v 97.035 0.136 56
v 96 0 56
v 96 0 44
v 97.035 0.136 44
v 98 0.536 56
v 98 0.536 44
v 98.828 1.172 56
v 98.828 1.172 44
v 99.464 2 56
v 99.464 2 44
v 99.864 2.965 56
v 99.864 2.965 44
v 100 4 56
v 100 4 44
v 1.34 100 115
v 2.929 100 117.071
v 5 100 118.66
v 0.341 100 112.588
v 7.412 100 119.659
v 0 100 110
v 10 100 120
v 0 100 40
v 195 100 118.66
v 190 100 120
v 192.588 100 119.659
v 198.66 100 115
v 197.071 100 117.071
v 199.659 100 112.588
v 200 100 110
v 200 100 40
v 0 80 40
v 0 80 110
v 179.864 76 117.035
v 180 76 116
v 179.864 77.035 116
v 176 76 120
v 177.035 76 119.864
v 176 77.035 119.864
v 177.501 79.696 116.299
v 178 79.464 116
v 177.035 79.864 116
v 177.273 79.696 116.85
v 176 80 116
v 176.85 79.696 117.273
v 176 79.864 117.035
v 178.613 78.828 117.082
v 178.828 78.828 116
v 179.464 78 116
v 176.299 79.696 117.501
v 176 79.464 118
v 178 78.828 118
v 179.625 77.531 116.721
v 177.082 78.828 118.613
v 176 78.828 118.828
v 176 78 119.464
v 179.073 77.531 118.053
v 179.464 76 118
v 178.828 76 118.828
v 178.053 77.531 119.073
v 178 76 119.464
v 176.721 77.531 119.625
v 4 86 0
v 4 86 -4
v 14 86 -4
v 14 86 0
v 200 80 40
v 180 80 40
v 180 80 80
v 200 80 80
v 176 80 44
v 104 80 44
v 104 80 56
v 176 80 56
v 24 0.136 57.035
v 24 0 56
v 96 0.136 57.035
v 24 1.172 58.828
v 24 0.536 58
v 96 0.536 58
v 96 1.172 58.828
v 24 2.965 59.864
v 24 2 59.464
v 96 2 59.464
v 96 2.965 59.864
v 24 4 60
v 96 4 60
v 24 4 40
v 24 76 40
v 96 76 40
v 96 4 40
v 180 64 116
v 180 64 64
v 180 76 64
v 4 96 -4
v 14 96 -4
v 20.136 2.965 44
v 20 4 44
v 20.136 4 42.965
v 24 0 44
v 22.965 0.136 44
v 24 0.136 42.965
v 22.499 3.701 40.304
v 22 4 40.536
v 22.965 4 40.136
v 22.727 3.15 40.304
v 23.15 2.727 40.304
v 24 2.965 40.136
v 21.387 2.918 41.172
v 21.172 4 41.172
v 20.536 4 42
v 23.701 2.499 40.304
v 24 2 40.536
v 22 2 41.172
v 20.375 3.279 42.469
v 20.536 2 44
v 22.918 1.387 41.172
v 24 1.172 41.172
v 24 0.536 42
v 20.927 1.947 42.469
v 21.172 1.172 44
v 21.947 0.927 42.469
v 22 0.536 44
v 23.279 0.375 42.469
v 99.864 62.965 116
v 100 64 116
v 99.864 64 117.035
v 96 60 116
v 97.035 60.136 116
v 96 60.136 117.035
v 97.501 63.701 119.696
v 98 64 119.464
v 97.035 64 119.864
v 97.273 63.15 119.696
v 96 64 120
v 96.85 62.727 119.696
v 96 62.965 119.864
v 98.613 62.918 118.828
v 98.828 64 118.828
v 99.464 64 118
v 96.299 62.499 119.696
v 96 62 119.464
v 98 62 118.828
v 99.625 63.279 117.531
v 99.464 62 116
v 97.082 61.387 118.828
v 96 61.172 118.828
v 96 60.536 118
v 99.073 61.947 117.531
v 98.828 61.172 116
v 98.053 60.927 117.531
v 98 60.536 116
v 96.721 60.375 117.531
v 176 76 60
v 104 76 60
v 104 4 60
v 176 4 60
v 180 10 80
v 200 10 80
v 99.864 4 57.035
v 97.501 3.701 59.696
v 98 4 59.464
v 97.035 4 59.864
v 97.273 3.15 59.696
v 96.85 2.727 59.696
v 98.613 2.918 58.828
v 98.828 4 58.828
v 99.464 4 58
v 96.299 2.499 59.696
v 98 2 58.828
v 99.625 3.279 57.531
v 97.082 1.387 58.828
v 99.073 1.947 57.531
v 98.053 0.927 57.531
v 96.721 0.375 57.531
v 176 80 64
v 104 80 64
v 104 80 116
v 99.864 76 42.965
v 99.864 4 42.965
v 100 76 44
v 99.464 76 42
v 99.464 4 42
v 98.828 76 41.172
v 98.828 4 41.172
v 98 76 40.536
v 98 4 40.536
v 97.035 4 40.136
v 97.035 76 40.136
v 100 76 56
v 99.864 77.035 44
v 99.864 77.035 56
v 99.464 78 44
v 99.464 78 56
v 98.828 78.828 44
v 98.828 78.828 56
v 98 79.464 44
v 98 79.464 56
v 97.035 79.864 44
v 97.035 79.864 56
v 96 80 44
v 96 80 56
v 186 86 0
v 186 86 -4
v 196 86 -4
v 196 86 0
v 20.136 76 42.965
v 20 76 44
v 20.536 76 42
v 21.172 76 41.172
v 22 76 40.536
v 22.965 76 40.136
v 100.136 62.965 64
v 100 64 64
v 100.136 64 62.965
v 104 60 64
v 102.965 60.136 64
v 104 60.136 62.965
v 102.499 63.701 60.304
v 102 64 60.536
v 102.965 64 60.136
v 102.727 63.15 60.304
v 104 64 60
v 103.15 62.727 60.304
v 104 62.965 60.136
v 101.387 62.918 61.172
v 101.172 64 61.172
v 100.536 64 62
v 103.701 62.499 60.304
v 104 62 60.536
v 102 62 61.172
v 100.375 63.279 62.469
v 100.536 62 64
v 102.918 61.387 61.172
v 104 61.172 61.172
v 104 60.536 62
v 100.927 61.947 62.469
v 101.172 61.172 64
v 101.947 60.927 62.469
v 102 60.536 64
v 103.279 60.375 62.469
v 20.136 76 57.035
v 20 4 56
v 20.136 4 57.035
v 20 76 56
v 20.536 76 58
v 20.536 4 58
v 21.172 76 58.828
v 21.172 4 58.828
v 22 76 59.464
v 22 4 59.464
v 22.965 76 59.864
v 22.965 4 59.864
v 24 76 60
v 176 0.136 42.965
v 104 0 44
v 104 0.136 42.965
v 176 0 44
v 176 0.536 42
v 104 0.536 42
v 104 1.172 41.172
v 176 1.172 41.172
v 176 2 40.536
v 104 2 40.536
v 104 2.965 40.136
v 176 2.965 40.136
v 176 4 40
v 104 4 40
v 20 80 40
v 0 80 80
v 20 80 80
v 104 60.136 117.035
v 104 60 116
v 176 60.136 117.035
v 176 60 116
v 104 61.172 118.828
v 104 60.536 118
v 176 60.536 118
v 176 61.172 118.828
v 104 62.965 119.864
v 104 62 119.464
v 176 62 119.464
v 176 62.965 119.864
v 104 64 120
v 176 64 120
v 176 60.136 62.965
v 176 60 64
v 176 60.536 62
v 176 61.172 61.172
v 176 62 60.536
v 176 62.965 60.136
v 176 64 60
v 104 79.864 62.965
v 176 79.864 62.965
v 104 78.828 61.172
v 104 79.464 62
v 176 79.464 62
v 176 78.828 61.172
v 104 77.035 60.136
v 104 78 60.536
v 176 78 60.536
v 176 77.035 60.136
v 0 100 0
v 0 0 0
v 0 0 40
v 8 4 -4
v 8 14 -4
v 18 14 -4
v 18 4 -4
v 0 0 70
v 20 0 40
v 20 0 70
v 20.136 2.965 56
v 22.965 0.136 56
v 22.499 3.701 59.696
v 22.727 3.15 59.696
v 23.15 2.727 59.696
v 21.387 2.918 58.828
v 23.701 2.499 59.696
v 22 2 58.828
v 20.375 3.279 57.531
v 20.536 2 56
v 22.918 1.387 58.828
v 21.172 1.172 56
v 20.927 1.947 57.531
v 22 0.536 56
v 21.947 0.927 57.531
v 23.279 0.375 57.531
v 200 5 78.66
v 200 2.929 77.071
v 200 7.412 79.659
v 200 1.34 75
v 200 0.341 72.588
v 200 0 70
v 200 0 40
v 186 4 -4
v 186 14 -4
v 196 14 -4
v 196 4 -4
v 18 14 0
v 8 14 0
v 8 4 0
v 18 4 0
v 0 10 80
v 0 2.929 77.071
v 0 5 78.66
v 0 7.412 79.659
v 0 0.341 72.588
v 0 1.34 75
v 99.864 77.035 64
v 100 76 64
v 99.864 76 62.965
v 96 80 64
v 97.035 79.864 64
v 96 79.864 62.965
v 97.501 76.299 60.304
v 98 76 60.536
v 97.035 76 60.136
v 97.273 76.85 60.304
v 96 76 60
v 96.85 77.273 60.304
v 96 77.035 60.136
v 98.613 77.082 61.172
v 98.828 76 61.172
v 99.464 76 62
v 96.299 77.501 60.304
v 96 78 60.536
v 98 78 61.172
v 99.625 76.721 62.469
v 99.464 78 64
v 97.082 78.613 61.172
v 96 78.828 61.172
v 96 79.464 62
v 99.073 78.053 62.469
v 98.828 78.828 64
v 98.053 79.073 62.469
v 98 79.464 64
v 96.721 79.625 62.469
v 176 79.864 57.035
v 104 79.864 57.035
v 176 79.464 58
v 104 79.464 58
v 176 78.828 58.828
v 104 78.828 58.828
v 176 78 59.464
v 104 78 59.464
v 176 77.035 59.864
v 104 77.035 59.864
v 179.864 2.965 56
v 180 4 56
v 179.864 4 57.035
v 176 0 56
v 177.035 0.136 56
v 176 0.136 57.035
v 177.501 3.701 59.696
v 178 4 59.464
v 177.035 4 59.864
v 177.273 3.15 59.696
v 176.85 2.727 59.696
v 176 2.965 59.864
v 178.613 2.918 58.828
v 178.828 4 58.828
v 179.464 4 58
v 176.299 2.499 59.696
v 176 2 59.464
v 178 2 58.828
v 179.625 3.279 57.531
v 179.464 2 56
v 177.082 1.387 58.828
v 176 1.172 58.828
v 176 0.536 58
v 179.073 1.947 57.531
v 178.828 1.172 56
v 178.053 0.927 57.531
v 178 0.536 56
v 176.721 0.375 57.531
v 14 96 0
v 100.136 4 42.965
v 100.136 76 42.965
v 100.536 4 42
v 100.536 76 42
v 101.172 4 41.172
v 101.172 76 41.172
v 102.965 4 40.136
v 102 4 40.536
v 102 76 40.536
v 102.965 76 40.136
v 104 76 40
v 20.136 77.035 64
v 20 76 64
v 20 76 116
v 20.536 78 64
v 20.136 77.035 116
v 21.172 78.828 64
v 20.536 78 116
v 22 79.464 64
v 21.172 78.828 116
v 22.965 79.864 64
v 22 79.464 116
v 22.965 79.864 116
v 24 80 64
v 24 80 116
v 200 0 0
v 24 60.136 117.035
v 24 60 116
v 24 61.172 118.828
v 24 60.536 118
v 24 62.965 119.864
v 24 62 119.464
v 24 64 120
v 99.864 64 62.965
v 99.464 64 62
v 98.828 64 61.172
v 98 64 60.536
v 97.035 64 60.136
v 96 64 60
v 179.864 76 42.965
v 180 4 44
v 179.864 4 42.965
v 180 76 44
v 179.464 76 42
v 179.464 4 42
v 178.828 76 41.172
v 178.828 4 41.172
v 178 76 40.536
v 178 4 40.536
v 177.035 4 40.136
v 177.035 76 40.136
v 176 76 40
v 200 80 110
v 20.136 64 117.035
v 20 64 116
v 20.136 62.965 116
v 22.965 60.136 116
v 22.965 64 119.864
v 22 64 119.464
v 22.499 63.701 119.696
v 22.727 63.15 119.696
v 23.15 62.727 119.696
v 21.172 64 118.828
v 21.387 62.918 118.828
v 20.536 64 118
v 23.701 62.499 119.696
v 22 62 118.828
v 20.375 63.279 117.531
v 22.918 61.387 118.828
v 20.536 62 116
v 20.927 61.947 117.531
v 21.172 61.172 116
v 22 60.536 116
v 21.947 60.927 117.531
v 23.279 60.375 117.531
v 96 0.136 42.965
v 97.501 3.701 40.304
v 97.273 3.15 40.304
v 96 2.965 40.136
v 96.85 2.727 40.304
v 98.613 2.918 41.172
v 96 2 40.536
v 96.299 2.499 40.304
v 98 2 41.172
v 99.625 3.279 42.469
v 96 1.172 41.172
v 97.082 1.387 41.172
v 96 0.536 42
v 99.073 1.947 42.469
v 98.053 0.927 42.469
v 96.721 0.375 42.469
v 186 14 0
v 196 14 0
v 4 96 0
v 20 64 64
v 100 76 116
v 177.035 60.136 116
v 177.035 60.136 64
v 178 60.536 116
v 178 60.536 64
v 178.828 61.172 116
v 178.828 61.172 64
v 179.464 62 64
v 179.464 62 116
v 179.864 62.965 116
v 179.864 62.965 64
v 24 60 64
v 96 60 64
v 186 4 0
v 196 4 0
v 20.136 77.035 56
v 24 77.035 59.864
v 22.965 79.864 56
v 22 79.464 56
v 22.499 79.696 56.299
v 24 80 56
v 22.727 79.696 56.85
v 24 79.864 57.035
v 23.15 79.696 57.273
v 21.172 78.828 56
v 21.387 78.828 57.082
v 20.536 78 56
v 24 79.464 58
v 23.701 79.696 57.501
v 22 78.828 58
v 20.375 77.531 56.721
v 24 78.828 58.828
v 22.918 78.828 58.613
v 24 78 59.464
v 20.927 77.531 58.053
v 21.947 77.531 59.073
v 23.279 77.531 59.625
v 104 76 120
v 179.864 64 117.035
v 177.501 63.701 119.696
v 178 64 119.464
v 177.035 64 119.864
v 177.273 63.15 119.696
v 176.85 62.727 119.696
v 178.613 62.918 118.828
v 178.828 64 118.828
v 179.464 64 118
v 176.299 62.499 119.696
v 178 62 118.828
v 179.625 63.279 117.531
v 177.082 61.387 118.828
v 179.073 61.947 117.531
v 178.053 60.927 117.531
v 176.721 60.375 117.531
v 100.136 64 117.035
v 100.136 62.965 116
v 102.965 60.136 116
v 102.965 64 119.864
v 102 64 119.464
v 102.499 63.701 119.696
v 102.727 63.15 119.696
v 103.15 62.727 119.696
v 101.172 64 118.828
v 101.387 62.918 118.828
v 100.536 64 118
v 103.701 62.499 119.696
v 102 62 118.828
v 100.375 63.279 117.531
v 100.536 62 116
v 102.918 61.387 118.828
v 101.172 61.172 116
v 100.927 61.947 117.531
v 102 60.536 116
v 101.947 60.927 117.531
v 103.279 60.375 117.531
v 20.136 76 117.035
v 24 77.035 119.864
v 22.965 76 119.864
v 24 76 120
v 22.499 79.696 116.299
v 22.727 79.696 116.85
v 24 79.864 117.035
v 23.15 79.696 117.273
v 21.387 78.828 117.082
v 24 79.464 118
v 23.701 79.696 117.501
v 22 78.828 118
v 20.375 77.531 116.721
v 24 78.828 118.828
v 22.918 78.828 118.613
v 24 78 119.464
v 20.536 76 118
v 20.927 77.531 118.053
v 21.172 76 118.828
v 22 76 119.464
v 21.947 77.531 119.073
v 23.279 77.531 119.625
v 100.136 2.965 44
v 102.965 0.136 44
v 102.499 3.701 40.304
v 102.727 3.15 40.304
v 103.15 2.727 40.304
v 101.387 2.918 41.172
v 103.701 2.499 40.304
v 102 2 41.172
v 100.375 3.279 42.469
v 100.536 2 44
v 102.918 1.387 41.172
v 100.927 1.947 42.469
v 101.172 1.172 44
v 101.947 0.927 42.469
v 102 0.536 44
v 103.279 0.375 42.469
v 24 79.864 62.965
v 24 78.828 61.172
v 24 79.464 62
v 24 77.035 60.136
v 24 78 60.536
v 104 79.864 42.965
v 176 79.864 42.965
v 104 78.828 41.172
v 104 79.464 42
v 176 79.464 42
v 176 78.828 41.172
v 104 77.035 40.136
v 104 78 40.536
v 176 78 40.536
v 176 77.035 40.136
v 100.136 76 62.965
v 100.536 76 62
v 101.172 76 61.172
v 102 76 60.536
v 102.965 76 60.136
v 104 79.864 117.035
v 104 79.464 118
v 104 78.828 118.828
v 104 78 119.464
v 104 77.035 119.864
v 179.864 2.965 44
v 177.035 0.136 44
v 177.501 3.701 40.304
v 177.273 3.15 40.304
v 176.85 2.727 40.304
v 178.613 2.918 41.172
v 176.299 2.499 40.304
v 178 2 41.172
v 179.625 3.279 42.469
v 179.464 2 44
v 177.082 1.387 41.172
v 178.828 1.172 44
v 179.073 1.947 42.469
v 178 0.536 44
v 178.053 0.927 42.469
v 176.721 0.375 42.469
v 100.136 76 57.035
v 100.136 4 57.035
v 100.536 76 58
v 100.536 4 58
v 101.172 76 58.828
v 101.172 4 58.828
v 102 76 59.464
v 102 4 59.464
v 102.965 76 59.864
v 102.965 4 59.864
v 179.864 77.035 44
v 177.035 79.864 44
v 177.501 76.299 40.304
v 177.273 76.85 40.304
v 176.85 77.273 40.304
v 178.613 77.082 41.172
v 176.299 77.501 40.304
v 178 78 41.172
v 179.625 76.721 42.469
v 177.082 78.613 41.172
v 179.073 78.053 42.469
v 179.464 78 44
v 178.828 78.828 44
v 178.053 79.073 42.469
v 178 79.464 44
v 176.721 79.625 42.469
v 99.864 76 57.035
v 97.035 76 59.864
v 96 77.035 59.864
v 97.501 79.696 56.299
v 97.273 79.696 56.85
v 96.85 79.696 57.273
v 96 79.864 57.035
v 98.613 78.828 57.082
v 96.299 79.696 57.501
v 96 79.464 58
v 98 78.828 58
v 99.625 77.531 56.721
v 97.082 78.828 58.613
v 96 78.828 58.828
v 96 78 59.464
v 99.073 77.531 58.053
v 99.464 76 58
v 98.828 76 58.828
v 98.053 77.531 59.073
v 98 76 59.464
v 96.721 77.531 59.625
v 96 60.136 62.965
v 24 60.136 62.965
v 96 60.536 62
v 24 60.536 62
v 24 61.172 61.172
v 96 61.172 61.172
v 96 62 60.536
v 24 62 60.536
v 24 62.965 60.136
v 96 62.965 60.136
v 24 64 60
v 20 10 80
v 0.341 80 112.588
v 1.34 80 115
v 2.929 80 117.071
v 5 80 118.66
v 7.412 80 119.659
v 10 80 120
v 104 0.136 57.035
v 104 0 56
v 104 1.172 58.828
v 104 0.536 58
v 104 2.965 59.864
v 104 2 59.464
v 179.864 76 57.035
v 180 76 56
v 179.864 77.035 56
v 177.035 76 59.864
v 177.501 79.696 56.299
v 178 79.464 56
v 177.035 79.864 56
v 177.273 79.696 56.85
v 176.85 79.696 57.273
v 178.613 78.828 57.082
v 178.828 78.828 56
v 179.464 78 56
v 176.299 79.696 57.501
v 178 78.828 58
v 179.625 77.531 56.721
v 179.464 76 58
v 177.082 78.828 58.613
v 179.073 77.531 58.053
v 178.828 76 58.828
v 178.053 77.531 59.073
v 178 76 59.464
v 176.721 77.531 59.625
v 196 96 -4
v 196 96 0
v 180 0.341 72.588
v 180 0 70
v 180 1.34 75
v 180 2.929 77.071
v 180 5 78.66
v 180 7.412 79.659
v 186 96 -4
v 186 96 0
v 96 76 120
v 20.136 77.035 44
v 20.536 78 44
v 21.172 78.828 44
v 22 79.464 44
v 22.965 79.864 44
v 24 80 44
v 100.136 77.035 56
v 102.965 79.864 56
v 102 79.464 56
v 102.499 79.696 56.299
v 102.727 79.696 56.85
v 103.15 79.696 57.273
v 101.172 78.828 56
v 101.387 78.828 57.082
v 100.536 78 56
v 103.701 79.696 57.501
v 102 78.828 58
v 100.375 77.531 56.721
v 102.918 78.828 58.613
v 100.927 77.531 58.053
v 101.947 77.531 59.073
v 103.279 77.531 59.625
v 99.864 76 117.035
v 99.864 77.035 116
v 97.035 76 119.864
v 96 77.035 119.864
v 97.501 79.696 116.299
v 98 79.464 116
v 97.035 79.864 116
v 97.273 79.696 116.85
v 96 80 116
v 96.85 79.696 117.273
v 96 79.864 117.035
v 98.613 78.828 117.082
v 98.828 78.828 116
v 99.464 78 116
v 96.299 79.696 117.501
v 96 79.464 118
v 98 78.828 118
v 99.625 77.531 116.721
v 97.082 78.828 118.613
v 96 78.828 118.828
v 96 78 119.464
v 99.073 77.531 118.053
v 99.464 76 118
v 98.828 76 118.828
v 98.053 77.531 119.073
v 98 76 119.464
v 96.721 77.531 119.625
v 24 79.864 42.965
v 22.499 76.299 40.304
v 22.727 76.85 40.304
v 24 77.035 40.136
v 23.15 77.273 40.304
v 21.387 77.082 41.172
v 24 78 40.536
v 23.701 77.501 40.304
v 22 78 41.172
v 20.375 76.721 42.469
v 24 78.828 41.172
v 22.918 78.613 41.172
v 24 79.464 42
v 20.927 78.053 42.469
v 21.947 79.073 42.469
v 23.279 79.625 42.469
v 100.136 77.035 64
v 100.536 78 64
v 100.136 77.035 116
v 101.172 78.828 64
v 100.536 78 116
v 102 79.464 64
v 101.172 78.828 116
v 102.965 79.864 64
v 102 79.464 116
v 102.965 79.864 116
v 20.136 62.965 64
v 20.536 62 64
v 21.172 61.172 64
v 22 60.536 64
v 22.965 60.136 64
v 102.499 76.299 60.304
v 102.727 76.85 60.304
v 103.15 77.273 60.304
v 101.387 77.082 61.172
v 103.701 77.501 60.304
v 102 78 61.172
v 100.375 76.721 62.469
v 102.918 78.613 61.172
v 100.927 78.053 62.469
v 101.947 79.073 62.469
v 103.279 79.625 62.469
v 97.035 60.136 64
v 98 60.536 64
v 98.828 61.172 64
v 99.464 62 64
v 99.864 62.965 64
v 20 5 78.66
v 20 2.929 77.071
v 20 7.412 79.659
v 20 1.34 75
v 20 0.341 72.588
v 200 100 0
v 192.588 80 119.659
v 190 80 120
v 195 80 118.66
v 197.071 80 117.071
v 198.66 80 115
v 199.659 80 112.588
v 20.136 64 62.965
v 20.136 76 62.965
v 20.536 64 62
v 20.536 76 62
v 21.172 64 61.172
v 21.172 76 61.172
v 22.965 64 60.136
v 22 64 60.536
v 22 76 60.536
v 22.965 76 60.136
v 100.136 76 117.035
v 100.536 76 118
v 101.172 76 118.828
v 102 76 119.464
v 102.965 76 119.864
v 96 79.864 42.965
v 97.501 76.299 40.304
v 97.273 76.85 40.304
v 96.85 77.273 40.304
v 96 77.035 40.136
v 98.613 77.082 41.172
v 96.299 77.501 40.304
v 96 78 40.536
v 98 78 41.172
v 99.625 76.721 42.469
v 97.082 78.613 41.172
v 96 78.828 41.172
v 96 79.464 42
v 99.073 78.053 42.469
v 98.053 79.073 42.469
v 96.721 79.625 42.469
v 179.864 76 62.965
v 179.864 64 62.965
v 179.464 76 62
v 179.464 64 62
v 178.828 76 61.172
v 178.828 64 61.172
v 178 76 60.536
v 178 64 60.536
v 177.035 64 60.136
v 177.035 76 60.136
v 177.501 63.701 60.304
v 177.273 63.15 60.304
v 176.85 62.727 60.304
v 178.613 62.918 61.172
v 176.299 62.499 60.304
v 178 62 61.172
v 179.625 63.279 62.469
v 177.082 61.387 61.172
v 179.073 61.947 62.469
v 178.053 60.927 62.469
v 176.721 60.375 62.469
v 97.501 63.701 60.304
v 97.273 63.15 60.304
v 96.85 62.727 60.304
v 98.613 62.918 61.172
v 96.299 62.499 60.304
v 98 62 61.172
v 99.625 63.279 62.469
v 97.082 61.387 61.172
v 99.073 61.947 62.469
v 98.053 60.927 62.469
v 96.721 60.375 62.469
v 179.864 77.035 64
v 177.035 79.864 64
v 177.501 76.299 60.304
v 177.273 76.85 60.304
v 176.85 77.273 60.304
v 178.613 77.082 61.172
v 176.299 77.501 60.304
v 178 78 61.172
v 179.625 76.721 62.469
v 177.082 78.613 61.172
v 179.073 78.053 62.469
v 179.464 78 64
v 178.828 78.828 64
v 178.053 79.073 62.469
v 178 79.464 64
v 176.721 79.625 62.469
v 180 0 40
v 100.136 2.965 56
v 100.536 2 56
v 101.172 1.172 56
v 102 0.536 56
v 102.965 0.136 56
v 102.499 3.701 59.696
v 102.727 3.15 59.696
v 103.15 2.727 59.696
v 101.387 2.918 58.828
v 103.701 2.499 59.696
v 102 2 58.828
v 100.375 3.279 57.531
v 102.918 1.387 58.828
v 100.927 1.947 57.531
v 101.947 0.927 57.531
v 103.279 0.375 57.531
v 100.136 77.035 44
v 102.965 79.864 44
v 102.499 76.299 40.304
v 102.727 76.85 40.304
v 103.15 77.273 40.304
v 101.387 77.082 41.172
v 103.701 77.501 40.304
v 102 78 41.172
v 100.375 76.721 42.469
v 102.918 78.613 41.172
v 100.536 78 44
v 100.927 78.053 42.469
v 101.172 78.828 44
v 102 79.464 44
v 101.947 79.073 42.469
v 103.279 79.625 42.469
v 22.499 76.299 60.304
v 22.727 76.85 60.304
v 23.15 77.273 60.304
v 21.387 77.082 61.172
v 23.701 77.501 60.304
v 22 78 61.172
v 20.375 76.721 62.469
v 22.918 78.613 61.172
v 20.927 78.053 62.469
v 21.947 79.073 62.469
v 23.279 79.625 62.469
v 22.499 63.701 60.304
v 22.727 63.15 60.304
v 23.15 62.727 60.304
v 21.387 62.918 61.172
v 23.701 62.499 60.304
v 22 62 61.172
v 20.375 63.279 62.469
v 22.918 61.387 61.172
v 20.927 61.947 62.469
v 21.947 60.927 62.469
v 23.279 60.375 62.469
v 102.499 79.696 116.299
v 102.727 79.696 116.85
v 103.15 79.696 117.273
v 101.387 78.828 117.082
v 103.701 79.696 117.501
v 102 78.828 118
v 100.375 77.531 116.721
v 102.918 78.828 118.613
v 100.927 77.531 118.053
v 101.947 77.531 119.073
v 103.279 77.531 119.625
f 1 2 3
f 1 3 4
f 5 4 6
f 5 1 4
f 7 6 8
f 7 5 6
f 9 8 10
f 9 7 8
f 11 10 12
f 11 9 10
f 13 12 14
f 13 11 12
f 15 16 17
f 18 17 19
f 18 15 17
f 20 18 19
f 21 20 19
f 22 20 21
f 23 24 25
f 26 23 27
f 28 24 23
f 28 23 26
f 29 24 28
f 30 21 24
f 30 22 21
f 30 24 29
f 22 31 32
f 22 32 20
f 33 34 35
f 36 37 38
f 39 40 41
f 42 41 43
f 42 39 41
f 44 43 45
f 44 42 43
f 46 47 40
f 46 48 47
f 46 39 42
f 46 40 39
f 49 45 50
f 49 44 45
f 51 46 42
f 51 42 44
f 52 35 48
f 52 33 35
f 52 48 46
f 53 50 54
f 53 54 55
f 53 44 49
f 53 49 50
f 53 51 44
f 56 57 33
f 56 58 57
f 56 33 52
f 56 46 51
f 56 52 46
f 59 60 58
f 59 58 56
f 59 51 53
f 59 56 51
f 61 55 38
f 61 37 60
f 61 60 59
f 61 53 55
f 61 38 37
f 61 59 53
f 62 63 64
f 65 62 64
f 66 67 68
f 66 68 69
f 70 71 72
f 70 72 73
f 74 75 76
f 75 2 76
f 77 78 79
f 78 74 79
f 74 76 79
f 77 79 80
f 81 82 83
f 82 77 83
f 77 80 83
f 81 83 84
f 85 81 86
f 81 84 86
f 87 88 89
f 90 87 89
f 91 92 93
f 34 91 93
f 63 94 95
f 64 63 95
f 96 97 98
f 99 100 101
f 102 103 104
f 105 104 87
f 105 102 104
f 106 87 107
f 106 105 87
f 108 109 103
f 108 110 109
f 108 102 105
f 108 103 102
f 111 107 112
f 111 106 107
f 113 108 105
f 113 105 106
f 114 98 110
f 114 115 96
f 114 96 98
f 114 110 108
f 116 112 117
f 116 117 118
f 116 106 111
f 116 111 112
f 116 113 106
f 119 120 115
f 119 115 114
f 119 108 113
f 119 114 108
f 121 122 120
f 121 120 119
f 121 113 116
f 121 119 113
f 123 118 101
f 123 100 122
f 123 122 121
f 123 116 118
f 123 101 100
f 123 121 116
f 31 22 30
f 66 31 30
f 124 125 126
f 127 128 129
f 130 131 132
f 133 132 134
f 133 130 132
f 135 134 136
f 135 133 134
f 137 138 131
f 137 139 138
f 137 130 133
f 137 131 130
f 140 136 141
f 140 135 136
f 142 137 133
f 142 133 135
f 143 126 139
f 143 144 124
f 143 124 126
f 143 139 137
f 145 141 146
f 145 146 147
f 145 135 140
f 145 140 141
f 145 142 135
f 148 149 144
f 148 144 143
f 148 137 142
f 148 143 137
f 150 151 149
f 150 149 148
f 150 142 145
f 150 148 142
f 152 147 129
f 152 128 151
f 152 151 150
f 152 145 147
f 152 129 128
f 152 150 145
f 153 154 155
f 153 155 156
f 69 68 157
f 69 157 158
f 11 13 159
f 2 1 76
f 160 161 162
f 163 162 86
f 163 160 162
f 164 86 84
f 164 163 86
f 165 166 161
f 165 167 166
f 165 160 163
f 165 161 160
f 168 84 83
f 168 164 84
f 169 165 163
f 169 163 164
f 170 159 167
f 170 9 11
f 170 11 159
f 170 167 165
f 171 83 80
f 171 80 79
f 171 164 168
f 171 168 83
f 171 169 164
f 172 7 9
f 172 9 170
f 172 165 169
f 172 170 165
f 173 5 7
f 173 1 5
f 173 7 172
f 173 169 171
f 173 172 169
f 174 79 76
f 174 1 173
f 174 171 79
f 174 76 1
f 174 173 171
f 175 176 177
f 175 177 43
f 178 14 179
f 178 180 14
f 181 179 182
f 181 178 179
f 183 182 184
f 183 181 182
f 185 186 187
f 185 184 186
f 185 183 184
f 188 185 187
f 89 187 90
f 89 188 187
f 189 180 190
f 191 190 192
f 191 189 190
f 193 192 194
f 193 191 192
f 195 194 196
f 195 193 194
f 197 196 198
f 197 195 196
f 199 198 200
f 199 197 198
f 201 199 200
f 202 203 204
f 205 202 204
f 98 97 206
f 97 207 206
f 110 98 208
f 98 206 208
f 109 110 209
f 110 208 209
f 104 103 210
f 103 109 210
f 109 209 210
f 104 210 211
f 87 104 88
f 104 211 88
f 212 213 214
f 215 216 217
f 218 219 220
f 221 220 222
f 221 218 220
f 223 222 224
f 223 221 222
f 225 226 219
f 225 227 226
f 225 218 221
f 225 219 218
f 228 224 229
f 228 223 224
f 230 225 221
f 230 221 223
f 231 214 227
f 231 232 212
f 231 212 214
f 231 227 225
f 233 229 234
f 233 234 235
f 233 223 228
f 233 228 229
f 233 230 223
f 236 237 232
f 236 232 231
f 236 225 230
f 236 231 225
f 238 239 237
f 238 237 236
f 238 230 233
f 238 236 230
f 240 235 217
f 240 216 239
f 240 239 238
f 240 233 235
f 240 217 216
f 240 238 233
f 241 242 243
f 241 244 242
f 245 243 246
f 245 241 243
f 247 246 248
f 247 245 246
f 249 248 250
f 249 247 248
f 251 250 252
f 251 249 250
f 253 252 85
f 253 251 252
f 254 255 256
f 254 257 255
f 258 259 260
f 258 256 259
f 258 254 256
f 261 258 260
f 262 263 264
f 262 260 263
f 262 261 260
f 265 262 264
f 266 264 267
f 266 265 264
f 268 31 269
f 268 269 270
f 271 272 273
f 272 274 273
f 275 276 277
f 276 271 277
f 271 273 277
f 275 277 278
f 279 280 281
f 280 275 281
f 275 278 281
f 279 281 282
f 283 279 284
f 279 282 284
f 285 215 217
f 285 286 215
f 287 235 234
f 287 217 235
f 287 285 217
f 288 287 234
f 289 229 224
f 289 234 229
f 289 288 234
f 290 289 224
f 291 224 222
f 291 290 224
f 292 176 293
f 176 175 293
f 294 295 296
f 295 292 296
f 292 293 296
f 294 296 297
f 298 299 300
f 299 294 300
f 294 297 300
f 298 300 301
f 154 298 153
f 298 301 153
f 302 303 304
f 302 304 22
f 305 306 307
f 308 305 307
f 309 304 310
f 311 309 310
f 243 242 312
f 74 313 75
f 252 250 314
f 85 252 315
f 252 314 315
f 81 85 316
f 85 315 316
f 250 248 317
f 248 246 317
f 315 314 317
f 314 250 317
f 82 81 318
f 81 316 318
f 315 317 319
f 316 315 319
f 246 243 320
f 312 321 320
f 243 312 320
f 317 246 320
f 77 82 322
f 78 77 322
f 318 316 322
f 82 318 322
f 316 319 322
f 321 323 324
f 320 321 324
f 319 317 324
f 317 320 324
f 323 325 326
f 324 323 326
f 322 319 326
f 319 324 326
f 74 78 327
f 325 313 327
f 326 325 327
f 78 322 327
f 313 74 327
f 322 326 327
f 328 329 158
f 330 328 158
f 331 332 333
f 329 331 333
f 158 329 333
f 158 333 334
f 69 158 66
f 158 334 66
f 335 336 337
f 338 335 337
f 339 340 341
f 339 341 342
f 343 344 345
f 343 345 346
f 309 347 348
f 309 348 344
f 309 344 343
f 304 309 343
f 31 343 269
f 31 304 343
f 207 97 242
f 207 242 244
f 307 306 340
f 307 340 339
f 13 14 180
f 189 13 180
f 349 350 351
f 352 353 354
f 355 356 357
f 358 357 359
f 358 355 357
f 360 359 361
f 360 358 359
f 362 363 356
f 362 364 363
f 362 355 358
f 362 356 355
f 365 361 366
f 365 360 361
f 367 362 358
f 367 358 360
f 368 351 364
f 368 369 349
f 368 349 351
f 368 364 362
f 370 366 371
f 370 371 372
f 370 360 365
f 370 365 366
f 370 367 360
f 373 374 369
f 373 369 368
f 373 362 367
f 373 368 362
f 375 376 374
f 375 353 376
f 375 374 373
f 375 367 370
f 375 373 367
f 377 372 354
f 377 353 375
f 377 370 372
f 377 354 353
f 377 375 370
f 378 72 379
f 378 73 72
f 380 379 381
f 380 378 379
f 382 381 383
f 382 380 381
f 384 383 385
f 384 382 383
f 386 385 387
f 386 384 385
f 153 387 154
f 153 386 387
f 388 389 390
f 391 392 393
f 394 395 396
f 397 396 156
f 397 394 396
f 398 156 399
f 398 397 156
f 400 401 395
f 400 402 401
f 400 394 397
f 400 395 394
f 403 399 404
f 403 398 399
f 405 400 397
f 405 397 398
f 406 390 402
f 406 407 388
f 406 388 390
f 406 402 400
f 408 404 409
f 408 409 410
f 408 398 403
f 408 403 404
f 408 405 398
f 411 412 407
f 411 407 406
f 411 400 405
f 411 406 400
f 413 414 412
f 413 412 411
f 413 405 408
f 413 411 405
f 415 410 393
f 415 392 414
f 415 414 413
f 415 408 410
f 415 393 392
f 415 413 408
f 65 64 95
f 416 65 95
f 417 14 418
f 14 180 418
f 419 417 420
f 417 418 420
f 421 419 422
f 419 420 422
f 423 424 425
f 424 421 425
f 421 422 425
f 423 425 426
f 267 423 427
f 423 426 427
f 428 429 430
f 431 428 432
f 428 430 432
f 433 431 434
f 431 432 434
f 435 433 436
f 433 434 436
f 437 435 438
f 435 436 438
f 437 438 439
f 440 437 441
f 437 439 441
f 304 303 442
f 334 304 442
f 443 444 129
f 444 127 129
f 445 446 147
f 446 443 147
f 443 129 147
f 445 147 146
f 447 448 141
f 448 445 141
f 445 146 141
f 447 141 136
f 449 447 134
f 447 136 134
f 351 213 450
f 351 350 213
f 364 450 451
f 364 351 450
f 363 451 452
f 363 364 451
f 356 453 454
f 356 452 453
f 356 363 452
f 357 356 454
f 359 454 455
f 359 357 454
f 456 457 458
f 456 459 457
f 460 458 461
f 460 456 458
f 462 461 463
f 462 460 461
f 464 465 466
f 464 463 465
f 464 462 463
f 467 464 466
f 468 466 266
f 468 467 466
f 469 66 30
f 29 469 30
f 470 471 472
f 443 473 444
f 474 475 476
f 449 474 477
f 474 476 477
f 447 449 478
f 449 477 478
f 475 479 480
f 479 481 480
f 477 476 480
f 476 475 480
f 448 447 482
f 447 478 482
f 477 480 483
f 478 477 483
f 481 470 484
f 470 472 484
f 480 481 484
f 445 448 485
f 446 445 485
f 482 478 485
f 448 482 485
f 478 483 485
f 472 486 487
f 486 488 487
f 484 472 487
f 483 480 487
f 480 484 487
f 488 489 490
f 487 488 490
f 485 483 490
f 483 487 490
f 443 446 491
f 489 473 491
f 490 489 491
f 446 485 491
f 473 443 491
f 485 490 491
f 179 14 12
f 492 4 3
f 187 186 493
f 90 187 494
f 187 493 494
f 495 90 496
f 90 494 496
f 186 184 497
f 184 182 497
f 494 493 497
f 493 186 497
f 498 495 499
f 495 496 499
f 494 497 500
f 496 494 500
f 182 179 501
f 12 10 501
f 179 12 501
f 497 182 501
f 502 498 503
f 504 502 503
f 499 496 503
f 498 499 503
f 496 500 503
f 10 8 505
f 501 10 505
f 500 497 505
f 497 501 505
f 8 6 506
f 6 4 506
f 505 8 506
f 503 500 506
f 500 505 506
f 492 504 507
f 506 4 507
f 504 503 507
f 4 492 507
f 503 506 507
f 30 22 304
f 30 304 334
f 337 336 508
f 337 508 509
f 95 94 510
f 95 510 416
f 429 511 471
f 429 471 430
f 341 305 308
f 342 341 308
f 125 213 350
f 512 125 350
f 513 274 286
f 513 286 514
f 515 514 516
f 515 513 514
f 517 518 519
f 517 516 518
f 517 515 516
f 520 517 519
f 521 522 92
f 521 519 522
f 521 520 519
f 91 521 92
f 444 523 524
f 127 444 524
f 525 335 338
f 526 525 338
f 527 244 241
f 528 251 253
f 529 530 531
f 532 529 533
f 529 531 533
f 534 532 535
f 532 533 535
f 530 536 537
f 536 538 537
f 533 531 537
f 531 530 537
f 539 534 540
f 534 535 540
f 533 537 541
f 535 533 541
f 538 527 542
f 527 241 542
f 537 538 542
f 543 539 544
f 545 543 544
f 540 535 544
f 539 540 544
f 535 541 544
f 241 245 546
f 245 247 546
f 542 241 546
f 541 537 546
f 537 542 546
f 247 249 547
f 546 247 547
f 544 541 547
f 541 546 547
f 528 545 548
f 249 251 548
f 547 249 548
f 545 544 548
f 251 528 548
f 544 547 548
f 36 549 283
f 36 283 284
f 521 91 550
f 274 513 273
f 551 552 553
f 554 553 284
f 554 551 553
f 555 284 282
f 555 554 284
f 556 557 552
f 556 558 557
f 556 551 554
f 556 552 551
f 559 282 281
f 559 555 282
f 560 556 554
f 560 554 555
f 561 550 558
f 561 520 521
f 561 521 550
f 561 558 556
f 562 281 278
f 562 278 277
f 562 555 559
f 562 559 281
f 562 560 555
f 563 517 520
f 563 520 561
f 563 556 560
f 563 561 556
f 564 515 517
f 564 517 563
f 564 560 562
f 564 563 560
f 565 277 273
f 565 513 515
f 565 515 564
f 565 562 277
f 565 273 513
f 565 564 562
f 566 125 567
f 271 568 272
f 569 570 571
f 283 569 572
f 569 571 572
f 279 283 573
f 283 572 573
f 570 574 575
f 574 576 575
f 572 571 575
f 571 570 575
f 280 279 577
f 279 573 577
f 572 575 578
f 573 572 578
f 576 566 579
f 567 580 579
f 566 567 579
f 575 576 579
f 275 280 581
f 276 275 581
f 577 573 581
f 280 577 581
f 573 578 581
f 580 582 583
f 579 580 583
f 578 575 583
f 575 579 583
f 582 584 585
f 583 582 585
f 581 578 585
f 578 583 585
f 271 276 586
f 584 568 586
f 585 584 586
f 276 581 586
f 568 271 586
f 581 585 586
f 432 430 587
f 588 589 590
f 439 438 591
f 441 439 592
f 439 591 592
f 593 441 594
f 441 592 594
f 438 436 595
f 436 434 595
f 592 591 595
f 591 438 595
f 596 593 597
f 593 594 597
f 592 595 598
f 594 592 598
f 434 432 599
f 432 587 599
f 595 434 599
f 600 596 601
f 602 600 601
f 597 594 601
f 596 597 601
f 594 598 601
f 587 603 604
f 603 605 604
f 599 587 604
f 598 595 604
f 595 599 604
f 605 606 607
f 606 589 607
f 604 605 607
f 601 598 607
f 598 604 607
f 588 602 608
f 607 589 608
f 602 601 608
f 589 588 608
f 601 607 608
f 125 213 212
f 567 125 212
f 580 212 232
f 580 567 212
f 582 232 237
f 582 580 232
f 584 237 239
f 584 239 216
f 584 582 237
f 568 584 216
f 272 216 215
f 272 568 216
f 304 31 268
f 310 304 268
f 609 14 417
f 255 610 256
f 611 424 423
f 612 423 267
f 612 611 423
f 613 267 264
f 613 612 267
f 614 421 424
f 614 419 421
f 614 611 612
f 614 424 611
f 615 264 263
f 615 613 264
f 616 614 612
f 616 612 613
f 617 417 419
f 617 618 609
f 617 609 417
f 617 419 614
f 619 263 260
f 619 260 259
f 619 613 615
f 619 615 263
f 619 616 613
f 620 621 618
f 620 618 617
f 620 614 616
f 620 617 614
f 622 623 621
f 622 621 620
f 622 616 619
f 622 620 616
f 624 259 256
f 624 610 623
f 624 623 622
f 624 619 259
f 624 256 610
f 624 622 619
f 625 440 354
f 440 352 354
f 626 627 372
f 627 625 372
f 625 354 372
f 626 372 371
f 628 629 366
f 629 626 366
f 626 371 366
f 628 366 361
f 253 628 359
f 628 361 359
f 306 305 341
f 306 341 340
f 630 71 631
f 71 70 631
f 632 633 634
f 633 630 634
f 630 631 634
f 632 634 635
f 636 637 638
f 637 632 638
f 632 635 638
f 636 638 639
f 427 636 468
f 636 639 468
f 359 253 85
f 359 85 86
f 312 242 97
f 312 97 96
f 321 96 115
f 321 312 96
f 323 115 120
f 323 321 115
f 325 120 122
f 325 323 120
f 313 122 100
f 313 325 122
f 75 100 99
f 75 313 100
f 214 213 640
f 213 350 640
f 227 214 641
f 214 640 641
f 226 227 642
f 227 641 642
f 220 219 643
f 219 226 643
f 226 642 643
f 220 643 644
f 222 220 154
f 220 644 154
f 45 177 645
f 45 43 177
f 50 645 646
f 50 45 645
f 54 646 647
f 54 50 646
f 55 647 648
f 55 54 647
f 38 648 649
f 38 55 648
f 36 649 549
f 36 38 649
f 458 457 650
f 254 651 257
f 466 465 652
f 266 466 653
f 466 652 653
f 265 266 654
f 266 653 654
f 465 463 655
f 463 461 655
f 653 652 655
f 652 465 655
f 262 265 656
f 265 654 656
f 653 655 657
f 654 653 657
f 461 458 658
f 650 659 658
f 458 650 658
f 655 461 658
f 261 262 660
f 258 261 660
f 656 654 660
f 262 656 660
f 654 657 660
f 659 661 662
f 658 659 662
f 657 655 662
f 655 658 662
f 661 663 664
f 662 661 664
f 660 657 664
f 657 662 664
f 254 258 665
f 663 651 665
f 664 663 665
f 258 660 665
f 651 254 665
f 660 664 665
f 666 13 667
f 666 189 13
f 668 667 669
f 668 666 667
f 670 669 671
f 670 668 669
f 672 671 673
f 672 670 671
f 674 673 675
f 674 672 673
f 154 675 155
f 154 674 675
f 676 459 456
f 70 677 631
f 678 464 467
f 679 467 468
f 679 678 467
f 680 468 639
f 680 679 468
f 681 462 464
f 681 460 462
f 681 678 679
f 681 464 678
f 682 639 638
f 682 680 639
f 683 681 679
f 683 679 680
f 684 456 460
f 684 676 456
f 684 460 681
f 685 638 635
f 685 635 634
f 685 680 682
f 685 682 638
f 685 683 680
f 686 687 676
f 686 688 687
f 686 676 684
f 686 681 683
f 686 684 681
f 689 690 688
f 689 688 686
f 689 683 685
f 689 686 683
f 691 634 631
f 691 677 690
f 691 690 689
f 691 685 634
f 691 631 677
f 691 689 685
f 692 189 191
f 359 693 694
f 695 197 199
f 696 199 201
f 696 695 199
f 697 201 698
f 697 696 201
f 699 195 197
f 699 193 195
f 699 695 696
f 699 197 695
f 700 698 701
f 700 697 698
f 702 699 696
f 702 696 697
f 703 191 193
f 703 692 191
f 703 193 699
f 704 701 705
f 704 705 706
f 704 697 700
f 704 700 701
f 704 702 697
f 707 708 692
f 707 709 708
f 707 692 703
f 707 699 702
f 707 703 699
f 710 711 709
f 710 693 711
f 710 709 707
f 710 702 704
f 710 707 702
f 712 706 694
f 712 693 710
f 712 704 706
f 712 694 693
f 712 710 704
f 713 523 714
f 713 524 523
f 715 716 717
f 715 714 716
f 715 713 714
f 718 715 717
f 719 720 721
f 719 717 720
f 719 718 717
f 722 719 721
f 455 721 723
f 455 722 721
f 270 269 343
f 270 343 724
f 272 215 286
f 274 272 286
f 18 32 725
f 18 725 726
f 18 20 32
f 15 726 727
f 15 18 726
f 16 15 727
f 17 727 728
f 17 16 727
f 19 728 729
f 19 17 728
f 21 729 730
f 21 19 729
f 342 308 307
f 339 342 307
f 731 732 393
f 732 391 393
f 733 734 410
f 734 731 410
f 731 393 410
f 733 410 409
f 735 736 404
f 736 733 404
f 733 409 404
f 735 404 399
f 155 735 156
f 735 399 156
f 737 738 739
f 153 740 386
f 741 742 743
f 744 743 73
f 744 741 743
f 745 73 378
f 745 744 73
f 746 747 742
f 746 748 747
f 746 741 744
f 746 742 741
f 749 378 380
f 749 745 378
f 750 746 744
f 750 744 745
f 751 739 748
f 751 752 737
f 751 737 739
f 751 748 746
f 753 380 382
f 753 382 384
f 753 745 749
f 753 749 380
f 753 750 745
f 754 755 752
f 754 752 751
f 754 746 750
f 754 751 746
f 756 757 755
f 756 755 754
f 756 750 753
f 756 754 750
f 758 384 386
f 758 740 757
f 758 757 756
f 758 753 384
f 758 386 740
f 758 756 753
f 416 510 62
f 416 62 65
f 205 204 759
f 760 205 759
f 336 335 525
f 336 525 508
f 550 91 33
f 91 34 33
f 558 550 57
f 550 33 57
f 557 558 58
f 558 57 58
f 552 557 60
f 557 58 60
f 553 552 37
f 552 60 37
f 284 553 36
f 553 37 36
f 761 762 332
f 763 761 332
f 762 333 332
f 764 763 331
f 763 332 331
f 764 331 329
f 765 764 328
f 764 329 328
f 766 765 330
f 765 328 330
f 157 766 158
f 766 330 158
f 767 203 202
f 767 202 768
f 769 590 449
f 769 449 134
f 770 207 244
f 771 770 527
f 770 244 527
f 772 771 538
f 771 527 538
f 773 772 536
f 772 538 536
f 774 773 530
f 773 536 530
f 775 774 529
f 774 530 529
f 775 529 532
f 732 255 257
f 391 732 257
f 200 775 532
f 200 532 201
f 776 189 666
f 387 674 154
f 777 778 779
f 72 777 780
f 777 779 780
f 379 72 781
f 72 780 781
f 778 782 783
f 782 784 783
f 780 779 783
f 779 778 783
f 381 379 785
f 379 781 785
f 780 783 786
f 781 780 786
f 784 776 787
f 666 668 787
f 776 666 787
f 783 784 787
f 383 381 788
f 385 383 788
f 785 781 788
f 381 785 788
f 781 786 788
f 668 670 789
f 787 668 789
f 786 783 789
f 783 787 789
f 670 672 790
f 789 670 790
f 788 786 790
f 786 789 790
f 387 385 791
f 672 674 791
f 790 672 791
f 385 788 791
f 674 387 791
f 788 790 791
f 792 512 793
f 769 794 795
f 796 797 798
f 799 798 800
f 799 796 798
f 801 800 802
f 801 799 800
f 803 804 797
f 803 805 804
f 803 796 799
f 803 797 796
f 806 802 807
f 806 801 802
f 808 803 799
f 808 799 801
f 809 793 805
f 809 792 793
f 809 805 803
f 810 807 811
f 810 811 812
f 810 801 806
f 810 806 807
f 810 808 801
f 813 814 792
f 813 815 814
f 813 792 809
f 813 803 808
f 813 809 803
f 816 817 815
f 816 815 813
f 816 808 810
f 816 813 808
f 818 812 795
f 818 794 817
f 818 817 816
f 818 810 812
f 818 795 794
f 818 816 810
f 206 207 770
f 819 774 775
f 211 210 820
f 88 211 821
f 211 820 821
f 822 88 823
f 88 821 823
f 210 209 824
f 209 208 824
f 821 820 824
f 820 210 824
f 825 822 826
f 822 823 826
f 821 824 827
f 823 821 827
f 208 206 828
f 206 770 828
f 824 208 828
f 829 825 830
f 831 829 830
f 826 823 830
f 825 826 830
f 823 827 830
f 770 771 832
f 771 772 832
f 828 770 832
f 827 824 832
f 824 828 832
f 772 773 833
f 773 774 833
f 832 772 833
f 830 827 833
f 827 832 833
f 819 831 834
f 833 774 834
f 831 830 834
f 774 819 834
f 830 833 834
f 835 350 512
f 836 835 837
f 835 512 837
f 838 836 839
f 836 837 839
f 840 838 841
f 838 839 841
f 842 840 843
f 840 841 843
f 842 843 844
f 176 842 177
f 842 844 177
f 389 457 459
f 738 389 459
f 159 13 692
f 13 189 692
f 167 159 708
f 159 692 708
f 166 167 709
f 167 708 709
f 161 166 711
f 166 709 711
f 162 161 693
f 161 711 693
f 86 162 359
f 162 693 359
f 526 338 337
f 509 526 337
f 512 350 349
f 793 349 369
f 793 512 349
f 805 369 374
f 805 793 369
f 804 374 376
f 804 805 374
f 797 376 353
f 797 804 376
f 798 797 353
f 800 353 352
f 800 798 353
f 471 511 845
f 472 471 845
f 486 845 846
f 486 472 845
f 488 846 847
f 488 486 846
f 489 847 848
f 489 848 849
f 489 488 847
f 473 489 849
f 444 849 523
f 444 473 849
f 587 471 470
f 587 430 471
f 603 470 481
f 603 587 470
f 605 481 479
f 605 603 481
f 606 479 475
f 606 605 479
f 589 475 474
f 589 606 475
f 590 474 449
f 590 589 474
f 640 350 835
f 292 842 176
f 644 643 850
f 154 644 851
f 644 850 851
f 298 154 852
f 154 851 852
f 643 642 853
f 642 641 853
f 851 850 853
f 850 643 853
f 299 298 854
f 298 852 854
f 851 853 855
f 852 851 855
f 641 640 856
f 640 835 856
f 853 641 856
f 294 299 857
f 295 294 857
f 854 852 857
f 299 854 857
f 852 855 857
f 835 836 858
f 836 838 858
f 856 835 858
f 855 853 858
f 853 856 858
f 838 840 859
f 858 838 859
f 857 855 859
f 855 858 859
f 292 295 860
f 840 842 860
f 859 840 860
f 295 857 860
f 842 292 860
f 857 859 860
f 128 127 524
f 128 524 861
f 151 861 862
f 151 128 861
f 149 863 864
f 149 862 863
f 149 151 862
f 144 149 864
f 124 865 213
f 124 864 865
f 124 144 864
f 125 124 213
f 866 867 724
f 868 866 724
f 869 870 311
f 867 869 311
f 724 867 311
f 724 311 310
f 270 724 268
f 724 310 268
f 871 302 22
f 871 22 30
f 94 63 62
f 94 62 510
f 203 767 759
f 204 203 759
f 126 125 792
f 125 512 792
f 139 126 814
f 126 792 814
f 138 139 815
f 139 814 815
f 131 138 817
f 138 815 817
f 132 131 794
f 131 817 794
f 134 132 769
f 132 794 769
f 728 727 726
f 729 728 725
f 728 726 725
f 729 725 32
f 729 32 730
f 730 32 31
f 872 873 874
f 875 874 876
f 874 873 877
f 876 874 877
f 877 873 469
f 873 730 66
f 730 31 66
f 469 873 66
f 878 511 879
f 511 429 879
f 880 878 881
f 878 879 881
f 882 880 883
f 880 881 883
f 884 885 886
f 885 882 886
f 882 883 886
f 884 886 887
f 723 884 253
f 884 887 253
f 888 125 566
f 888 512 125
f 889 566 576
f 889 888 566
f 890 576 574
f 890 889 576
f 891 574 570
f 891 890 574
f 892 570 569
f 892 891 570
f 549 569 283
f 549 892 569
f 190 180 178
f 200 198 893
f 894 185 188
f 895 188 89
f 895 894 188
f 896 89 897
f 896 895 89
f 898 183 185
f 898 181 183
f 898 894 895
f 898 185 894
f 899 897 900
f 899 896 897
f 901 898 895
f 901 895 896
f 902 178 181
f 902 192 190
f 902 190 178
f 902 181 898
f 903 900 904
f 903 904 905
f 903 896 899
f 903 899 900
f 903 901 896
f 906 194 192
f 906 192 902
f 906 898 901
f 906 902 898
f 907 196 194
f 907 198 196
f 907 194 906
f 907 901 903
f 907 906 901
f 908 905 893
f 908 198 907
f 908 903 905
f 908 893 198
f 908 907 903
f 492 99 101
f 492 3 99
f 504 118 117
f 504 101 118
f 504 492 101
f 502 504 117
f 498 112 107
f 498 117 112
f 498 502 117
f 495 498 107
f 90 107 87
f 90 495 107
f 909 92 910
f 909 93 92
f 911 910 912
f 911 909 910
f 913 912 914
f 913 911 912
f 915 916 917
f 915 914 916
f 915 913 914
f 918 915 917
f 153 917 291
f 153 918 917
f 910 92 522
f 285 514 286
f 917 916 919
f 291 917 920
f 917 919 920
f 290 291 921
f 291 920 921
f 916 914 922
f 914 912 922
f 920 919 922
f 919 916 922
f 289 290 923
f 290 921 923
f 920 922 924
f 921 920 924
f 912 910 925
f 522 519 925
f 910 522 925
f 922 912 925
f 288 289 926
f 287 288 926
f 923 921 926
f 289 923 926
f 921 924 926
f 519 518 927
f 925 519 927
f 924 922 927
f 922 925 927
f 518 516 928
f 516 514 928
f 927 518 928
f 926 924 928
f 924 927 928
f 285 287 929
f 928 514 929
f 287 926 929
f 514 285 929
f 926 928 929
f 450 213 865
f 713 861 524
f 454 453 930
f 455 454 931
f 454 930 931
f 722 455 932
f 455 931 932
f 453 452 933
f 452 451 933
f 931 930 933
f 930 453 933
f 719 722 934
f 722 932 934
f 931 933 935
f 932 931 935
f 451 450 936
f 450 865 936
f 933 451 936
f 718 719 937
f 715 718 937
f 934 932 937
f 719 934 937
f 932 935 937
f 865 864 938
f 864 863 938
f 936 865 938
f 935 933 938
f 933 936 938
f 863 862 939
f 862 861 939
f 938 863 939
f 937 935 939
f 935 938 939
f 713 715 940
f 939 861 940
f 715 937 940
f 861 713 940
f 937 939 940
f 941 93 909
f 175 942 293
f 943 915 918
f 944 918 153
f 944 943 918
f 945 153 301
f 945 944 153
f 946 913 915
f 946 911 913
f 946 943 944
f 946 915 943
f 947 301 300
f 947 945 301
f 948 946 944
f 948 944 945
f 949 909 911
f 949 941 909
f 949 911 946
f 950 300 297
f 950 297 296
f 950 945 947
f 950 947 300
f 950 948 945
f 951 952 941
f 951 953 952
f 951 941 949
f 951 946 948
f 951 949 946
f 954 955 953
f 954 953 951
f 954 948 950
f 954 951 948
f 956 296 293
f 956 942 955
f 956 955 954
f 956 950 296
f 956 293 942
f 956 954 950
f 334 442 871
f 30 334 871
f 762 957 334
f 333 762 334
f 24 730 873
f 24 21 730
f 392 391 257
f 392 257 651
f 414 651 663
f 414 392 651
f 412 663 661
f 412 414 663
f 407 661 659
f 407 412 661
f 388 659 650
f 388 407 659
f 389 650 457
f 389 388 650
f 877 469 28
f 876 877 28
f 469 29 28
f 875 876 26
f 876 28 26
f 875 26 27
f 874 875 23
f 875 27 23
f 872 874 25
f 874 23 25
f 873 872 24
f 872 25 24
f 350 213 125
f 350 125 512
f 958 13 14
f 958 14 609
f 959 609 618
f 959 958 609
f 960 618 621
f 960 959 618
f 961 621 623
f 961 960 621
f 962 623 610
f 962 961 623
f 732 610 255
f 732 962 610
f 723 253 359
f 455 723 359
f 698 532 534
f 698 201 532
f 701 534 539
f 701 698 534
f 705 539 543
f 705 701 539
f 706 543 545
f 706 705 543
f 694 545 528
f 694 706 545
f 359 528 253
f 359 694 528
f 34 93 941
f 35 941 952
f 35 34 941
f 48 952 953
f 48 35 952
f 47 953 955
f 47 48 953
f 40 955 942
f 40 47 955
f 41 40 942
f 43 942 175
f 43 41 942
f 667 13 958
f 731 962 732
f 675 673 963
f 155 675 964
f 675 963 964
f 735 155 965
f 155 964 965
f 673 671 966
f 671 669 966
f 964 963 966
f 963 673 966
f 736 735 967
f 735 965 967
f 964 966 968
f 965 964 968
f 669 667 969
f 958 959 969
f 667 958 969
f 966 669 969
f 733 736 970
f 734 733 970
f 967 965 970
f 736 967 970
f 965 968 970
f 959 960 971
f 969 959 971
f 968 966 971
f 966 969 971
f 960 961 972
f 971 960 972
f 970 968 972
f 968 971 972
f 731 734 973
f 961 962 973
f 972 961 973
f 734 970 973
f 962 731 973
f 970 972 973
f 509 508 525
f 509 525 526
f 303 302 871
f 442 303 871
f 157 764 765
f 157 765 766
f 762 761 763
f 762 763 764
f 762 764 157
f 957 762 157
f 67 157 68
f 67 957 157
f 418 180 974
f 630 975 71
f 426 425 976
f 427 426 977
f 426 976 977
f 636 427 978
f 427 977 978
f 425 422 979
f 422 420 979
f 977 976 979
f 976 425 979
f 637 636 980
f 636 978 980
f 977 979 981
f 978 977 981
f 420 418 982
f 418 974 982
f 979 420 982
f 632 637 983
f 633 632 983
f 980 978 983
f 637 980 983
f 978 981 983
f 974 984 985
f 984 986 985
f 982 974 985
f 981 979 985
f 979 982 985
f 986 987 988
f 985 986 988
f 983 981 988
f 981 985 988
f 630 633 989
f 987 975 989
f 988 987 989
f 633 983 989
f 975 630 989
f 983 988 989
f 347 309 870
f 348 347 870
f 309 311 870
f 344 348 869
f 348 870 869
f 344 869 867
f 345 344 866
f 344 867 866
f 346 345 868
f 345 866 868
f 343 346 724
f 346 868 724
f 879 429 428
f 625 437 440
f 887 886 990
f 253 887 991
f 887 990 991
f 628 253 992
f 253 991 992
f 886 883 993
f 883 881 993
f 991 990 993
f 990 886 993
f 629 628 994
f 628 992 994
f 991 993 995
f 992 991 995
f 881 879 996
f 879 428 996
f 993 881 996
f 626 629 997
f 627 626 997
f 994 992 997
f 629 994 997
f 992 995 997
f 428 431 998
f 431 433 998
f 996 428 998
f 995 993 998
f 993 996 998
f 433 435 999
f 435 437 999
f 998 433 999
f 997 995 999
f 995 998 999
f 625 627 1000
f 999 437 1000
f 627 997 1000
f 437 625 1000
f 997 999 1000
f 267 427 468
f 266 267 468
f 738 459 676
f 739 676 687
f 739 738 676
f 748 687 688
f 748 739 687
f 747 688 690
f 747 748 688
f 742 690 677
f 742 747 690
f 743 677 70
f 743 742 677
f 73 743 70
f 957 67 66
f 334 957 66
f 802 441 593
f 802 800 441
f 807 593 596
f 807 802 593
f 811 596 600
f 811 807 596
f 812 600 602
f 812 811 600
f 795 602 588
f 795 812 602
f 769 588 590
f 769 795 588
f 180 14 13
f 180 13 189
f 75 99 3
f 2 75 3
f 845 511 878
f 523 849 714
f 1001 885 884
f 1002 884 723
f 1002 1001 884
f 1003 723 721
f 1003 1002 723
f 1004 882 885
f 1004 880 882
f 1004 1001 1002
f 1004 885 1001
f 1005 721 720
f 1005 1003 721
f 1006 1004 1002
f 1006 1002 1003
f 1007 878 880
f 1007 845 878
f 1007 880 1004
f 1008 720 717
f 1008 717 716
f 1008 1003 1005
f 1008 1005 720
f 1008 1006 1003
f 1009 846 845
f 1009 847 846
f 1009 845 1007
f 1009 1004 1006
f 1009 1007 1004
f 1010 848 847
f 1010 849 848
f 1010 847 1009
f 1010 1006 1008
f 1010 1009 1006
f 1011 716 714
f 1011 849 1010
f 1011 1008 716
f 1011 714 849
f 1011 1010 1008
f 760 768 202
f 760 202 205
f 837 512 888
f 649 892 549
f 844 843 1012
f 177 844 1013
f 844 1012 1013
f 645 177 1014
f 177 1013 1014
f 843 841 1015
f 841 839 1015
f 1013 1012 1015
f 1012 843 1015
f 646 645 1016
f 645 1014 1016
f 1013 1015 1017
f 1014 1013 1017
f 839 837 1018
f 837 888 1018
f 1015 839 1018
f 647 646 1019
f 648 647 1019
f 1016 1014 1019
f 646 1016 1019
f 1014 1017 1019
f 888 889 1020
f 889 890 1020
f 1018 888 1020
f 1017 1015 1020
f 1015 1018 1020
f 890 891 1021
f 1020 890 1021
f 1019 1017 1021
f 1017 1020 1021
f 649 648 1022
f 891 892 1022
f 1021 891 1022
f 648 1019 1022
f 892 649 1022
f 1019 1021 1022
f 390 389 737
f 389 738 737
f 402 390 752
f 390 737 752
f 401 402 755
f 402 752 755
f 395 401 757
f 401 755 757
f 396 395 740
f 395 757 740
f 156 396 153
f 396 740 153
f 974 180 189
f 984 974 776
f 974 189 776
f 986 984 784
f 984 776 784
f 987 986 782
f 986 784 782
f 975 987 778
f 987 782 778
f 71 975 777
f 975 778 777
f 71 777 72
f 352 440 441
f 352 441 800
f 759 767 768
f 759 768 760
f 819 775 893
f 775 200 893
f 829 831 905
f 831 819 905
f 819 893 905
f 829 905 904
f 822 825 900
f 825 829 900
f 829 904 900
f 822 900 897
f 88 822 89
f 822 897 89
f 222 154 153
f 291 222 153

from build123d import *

# Parameters (mm, degrees)
BOX_W        = 200
BOX_H        = 100
BOX_DEPTH    = 40
BOX001_W     = 20
BOX001_H     = 80
BOX001_DEPTH = 40
FILLET_R     = 10
BOX002_W     = 20
BOX002_H     = 80
BOX002_DEPTH = 40
FILLET001_R  = 10
BOX003_W     = 200
BOX003_H     = 20
BOX003_DEPTH = 80
FILLET002_R  = 10
BOX004_W     = 80
BOX004_H     = 80
BOX004_DEPTH = 20
FILLET003_R  = 4
BOX005_W     = 80
BOX005_H     = 80
BOX005_DEPTH = 20
FILLET004_R  = 4
BOX006_W     = 80
BOX006_H     = 20
BOX006_DEPTH = 60
FILLET005_R  = 4
BOX007_W     = 80
BOX007_H     = 20
BOX007_DEPTH = 60
FILLET006_R  = 4
BOX008_W     = 10
BOX008_H     = 10
BOX008_DEPTH = 4
BOX009_W     = 10
BOX009_H     = 10
BOX009_DEPTH = 4
BOX010_W     = 10
BOX010_H     = 10
BOX010_DEPTH = 4
BOX011_W     = 10
BOX011_H     = 10
BOX011_DEPTH = 4


with BuildPart() as cube:
    # Box → Box (new body)
    with BuildSketch(Plane.XY):
        with Locations((100, 50)):
            Rectangle(BOX_W, BOX_H)
    extrude(amount=BOX_DEPTH)


with BuildPart() as fillet_body:
    # Box001 → Box001 (new body)
    with BuildSketch(Plane.XY.offset(40)):
        with Locations((10, 40)):
            Rectangle(BOX001_W, BOX001_H)
    extrude(amount=BOX001_DEPTH)

    # Fillet
    fillet_edges = [fillet_body.edges().sort_by_distance(p)[0] for p in [
        (10, 0, 80),
    ]]
    fillet(fillet_edges, radius=FILLET_R)


with BuildPart() as fillet001:
    # Box002 → Box002 (new body)
    with BuildSketch(Plane.XY.offset(40)):
        with Locations((10, 40)):
            Rectangle(BOX002_W, BOX002_H)
    extrude(amount=BOX002_DEPTH)

    # Fillet001
    fillet001_edges = [fillet001.edges().sort_by_distance(p)[0] for p in [
        (10, 0, 80),
    ]]
    fillet(fillet001_edges, radius=FILLET001_R)


with BuildPart() as fillet001_1:
    # Fillet001 placement: moved
    add(fillet001.part.moved(Location((180, 0, 0))))


with BuildPart() as fillet002:
    # Box003 → Box003 (new body)
    with BuildSketch(Plane(origin=(0, 80, 40), x_dir=(1, 0, 0), z_dir=(0, 0, 1))):
        with Locations((100, 10)):
            Rectangle(BOX003_W, BOX003_H)
    extrude(amount=BOX003_DEPTH)

    # Fillet002
    fillet002_edges = [fillet002.edges().sort_by_distance(p)[0] for p in [
        (0, 90, 120),
        (200, 90, 120),
    ]]
    fillet(fillet002_edges, radius=FILLET002_R)


with BuildPart() as fillet003:
    # Box004 → Box004 (new body)
    with BuildSketch(Plane(origin=(20, 0, 40), x_dir=(1, 0, 0), z_dir=(0, 0, 1))):
        with Locations((40, 40)):
            Rectangle(BOX004_W, BOX004_H)
    extrude(amount=BOX004_DEPTH)

    # Fillet003
    fillet003_edges = [fillet003.edges().sort_by_distance(p)[0] for p in [
        (20, 0, 50),
        (20, 40, 60),
        (20, 80, 50),
        (20, 40, 40),
        (100, 0, 50),
        (100, 40, 60),
        (100, 80, 50),
        (100, 40, 40),
        (60, 0, 40),
        (60, 0, 60),
        (60, 80, 40),
        (60, 80, 60),
    ]]
    fillet(fillet003_edges, radius=FILLET003_R)


with BuildPart() as fillet003_1:
    # Fillet003 placement: moved
    add(fillet003.part.moved(Location((80, 0, 0))))


with BuildPart() as fillet004:
    # Box005 → Box005 (new body)
    with BuildSketch(Plane(origin=(20, 0, 40), x_dir=(1, 0, 0), z_dir=(0, 0, 1))):
        with Locations((40, 40)):
            Rectangle(BOX005_W, BOX005_H)
    extrude(amount=BOX005_DEPTH)

    # Fillet004
    fillet004_edges = [fillet004.edges().sort_by_distance(p)[0] for p in [
        (20, 0, 50),
        (20, 40, 60),
        (20, 80, 50),
        (20, 40, 40),
        (100, 0, 50),
        (100, 40, 60),
        (100, 80, 50),
        (100, 40, 40),
        (60, 0, 40),
        (60, 0, 60),
        (60, 80, 40),
        (60, 80, 60),
    ]]
    fillet(fillet004_edges, radius=FILLET004_R)


with BuildPart() as fillet005:
    # Box006 → Box006 (new body)
    with BuildSketch(Plane(origin=(20, 60, 60), x_dir=(1, 0, 0), z_dir=(0, 0, 1))):
        with Locations((40, 10)):
            Rectangle(BOX006_W, BOX006_H)
    extrude(amount=BOX006_DEPTH)

    # Fillet005
    fillet005_edges = [fillet005.edges().sort_by_distance(p)[0] for p in [
        (20, 60, 90),
        (20, 70, 120),
        (20, 80, 90),
        (20, 70, 60),
        (100, 60, 90),
        (100, 70, 120),
        (100, 80, 90),
        (100, 70, 60),
        (60, 60, 60),
        (60, 60, 120),
        (60, 80, 60),
        (60, 80, 120),
    ]]
    fillet(fillet005_edges, radius=FILLET005_R)


with BuildPart() as fillet006:
    # Box007 → Box007 (new body)
    with BuildSketch(Plane(origin=(20, 60, 60), x_dir=(1, 0, 0), z_dir=(0, 0, 1))):
        with Locations((40, 10)):
            Rectangle(BOX007_W, BOX007_H)
    extrude(amount=BOX007_DEPTH)

    # Fillet006
    fillet006_edges = [fillet006.edges().sort_by_distance(p)[0] for p in [
        (20, 60, 90),
        (20, 70, 120),
        (20, 80, 90),
        (20, 70, 60),
        (100, 60, 90),
        (100, 70, 120),
        (100, 80, 90),
        (100, 70, 60),
        (60, 60, 60),
        (60, 60, 120),
        (60, 80, 60),
        (60, 80, 120),
    ]]
    fillet(fillet006_edges, radius=FILLET006_R)


with BuildPart() as fillet006_1:
    # Fillet006 placement: moved
    add(fillet006.part.moved(Location((80, 0, 0))))


with BuildPart() as cube008:
    # Box008 → Box008 (new body)
    with BuildSketch(Plane(origin=(8, 4, -4), x_dir=(1, 0, 0), z_dir=(0, 0, 1))):
        with Locations((5, 5)):
            Rectangle(BOX008_W, BOX008_H)
    extrude(amount=BOX008_DEPTH)


with BuildPart() as cube009:
    # Box009 → Box009 (new body)
    with BuildSketch(Plane(origin=(4, 86, -4), x_dir=(1, 0, 0), z_dir=(0, 0, 1))):
        with Locations((5, 5)):
            Rectangle(BOX009_W, BOX009_H)
    extrude(amount=BOX009_DEPTH)


with BuildPart() as cube010:
    # Box010 → Box010 (new body)
    with BuildSketch(Plane(origin=(186, 4, -4), x_dir=(1, 0, 0), z_dir=(0, 0, 1))):
        with Locations((5, 5)):
            Rectangle(BOX010_W, BOX010_H)
    extrude(amount=BOX010_DEPTH)


with BuildPart() as cube011:
    # Box011 → Box011 (new body)
    with BuildSketch(Plane(origin=(186, 86, -4), x_dir=(1, 0, 0), z_dir=(0, 0, 1))):
        with Locations((5, 5)):
            Rectangle(BOX011_W, BOX011_H)
    extrude(amount=BOX011_DEPTH)


solid = Compound([cube.part, fillet_body.part, fillet001_1.part, fillet002.part, fillet003_1.part, fillet004.part, fillet005.part, fillet006_1.part, cube008.part, cube009.part, cube010.part, cube011.part])
